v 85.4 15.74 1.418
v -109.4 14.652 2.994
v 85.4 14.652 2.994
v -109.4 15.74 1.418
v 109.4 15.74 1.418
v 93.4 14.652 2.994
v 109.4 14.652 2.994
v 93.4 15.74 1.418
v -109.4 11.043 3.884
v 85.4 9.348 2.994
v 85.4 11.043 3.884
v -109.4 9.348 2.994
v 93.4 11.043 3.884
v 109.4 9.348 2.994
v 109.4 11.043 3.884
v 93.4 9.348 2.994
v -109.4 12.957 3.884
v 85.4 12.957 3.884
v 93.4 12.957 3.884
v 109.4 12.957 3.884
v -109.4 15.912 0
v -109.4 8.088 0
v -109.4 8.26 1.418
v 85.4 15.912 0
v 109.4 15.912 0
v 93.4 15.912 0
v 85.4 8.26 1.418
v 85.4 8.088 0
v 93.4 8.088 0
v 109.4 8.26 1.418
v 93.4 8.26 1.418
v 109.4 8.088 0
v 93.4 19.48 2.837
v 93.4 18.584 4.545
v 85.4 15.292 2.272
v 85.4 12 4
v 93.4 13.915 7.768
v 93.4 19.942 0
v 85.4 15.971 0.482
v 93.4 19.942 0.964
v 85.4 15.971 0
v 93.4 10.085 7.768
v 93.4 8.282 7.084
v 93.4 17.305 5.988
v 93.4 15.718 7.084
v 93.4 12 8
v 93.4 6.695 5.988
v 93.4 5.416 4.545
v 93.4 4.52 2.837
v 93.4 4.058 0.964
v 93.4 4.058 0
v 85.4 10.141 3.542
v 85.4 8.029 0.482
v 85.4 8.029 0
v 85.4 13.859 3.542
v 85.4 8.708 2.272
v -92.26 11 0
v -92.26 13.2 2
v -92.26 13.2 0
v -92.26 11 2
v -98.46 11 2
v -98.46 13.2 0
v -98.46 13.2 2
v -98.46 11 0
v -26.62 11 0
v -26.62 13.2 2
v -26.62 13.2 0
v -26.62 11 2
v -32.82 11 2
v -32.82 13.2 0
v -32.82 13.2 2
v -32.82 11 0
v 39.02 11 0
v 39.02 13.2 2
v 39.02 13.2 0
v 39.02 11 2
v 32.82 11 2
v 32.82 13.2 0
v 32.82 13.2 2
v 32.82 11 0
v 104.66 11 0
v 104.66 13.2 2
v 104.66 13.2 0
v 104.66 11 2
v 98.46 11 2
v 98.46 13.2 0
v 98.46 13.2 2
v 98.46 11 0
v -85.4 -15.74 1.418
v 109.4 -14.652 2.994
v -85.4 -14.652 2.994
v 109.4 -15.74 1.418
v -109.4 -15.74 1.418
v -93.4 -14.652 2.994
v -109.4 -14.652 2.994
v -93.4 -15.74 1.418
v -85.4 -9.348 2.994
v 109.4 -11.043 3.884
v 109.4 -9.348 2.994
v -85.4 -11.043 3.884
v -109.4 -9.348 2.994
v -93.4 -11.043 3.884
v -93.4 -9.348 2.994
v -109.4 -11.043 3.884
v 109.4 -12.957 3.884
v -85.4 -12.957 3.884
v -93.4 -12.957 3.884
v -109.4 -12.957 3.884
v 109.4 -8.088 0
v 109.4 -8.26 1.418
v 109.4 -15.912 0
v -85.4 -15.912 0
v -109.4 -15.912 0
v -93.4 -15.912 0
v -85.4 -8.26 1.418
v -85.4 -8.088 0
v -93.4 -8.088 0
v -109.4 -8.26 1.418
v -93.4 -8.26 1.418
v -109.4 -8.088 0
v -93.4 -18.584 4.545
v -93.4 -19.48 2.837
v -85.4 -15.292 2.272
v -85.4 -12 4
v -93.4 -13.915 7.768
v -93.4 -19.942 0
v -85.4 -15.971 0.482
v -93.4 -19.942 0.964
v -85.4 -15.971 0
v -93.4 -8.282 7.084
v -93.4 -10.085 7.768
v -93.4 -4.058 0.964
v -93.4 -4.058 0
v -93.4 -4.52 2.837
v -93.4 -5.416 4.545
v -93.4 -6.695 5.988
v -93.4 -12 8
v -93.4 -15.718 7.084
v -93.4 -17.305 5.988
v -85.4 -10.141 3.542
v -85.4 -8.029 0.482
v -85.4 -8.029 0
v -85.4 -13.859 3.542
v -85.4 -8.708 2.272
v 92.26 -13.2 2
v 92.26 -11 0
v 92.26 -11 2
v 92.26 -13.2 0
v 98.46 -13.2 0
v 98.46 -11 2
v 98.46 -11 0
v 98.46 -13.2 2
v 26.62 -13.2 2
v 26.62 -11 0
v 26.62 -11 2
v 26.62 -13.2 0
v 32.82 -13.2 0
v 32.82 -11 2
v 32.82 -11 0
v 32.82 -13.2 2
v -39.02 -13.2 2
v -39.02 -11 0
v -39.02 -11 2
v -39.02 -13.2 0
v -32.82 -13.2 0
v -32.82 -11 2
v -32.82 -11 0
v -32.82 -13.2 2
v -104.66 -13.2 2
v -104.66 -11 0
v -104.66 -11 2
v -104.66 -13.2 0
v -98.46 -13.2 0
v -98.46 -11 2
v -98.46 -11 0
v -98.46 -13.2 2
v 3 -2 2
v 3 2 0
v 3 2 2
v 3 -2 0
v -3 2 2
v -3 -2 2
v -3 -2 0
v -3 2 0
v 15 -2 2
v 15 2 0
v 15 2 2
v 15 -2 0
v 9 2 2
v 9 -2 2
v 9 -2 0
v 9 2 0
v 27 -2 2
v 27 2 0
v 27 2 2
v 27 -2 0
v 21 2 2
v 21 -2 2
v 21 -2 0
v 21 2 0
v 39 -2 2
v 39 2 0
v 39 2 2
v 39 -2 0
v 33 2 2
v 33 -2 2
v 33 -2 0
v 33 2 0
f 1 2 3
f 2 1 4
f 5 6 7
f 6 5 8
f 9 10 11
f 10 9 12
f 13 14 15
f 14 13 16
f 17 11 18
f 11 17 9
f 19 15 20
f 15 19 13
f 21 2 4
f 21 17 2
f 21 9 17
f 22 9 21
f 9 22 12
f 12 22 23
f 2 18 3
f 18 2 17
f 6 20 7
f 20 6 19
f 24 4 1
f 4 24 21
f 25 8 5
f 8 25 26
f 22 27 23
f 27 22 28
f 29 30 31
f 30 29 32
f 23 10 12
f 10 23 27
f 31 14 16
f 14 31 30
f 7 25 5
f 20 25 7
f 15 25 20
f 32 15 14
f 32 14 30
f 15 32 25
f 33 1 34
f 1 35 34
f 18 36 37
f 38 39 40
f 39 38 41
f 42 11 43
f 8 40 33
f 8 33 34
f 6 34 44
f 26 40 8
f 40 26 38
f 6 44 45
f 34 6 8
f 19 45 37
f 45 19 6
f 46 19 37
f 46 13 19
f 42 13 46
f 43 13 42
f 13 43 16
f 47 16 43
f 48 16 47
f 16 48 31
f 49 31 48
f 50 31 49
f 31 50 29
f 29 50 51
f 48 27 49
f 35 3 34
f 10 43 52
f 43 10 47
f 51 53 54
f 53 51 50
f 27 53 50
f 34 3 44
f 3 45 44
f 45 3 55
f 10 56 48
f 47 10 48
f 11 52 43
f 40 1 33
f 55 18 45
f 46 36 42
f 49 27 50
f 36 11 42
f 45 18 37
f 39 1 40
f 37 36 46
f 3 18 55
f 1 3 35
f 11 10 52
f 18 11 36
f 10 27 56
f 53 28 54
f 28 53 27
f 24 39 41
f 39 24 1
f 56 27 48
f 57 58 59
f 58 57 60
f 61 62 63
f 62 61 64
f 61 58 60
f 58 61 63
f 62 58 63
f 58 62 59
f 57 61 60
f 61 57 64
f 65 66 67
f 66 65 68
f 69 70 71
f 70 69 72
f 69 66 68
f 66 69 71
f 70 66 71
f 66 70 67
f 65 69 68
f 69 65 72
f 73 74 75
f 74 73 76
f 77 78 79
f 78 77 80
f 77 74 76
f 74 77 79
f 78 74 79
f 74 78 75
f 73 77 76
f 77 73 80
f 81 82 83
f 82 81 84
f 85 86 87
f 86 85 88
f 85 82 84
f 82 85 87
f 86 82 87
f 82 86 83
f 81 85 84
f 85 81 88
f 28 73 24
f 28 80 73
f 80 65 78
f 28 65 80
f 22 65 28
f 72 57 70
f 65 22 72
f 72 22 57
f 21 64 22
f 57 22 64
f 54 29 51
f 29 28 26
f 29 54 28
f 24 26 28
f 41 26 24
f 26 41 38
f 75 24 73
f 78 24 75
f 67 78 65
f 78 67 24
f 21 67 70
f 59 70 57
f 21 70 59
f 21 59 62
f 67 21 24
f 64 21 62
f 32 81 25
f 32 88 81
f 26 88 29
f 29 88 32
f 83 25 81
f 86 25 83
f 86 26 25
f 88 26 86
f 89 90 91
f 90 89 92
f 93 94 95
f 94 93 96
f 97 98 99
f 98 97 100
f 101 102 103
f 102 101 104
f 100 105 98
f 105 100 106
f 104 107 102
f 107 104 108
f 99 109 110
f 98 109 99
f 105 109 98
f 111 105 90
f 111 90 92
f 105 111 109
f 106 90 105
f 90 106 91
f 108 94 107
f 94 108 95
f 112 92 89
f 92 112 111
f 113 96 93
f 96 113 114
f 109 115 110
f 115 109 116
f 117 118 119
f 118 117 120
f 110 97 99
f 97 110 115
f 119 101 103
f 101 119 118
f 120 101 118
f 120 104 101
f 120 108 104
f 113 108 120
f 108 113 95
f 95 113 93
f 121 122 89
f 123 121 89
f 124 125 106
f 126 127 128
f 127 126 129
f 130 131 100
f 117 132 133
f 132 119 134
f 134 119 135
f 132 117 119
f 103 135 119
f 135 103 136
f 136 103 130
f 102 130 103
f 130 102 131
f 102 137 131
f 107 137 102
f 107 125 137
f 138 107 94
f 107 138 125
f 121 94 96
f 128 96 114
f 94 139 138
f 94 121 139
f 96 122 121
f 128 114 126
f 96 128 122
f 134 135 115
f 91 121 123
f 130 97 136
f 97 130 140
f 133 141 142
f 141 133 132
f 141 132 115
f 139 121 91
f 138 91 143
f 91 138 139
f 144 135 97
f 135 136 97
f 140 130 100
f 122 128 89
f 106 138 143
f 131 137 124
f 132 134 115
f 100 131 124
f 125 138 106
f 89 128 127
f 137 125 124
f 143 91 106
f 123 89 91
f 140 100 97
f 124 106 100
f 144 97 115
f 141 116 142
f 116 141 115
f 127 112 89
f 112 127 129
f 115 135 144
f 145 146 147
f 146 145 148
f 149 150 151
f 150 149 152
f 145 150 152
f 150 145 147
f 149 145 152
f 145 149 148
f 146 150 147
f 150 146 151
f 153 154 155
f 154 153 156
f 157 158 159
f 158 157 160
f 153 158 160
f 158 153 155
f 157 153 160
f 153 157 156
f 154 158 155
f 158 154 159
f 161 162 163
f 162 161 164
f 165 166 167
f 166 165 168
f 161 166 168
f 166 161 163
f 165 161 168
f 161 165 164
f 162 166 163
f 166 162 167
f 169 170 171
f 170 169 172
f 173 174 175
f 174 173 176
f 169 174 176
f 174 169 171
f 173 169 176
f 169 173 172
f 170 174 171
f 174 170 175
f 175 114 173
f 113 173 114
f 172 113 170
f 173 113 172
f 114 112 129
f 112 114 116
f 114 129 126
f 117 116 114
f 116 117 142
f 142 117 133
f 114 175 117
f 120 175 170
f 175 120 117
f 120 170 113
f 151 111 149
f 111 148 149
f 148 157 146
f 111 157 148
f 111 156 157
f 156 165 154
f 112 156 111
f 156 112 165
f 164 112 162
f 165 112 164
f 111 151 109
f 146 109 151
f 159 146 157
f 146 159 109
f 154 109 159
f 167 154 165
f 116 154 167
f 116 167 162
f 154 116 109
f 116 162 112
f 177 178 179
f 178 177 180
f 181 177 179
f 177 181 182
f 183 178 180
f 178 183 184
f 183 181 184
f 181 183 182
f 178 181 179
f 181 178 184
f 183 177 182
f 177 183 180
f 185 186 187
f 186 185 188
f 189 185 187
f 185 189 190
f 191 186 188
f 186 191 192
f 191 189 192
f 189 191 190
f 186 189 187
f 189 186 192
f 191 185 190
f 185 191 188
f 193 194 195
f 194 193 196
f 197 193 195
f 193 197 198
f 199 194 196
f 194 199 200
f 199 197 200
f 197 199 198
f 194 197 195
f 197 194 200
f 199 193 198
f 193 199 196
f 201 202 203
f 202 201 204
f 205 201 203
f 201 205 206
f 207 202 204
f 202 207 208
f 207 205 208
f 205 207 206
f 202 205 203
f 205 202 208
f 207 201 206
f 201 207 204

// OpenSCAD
// file: carousel-config.scad
// ----------------------------------------------------------------------------
// Configuration of the carousel and its components.
//
// All the values beyod "---- derived" string in each of the sections should
// not be modified manually, as they are derived from the previously defined
// parameters in some way...
// ----------------------------------------------------------------------------

// Generic parameters to address consistency & interconnections of parts.
CYL_FN = 32; // BEWARE!!! set to +- 256 for STL export!
BLEED = 0.5; // overlap for union & difference operations
EASE = 0.2; // socket/pin ease for interconnecting of parts & holes

// Core defining shape of our carousel is N-faced cylinder.
// This affects most of the subsequent parameter definitions & usage.
CAROUSEL_FACE_COUNT = 6;
CAROUSEL_ESCRIBED_RADIUS = 120;
// ---- derived
CAROUSEL_INSCRIBED_RADIUS = CAROUSEL_ESCRIBED_RADIUS * cos(180/CAROUSEL_FACE_COUNT);

// Base of the carousel -> stand that holds the axle, walls, etc.
BASE_TOTAL_HEIGHT = 24;
BASE_FLOOR_THICKNESS = 4;
BASE_WALL_THICKNESS = 4;

// Face, or, a wall of the carousel "shell".
FACE_HEIGHT = 150;
FACE_THICKNESS = 5;
// ---- derived
FACE_WIDTH = CAROUSEL_ESCRIBED_RADIUS * 2 * sin(180/CAROUSEL_FACE_COUNT);
FACE_ANGLE = (1 - 2/CAROUSEL_FACE_COUNT)*180;
FACE_APOTHEM_LEN = FACE_WIDTH / (2 * tan(180/CAROUSEL_FACE_COUNT));
FACE_DOOR_HEIGHT = 0.66 * FACE_HEIGHT;
FACE_DOOR_WIDTH = 0.75 * FACE_WIDTH;

// Roof of the carousel.
ROOF_THICKNESS = 2;
ROOF_HEIGHT = 1.3 * FACE_HEIGHT;

// Ball bearing - real-life dimensions of ball bearing used to "power" the axle.
BEARING_OUTER_D = 22;
BEARING_INNER_D = 8;
BEARING_HEIGHT = 7;
BEARING_SHELL_THICKNESS = 2;

// Axle rotating inside carousel.
AXLE_RADIUS = 4;

// Rotating rig carrying the seats.
RIG_HEIGHT = 6;
RIG_STR = 6;

// Abstract "rings" carrying seats, and their distance off the carousel center
// as a fraction of radius.
RIG_RING_POSITIONS = [0.3, 0.6, 0.9];
RIG_MAX_R = 0.90 * CAROUSEL_INSCRIBED_RADIUS;
// main file
include <carousel-config.scad>;

_AXLE_COLOR = "SaddleBrown";

arm_height = 2 * AXLE_RADIUS;
axle_height = ROOF_HEIGHT + BASE_TOTAL_HEIGHT - EASE;

module carousel_axle_arms() {
    arm_length = 8 * AXLE_RADIUS;
    arm_width = AXLE_RADIUS;

    color(_AXLE_COLOR) {
        difference() {
            union() {
                cylinder(h = arm_height, r = 2 * AXLE_RADIUS);
                for (i = [0 : CAROUSEL_FACE_COUNT/2]){
                    rotate(2 * i * 360/CAROUSEL_FACE_COUNT, [0, 0, 1])
                    translate([0, -arm_width/2, 0])
                    cube([arm_length, arm_width, arm_height]);
                }    
            }
            translate([0, 0, -BLEED/2])
                cylinder(h = arm_height + BLEED, r = AXLE_RADIUS + EASE);
        }
    }
}

module carousel_axle() {
    color(_AXLE_COLOR) {
        cylinder(h = axle_height, r = AXLE_RADIUS);
        translate([0, 0, axle_height - 3 * arm_height])
            cylinder(h = 2 * AXLE_RADIUS, r1 = AXLE_RADIUS, r2 = 2 * AXLE_RADIUS);
    }    
}

// just for presentation, for 3D print the separate parts are better...
module carousel_axle_all_in_one() {
    carousel_axle();
    translate([0, 0, axle_height - 2 * arm_height])
    carousel_axle_arms();
}

PEG_SIZE = [0.5 * AXLE_RADIUS, 0.5 * AXLE_RADIUS, 1.5 * AXLE_RADIUS];

module carousel_axle_half() {
    peg_heights = [0.05, 0.35, 0.65, 0.95];

    translate([-axle_height/2, 0, 0])
    rotate([0, 90, 0])
    difference() {
        carousel_axle();
        translate([0, -5 * AXLE_RADIUS, -BLEED/2])
            cube([10 * AXLE_RADIUS, 10 * AXLE_RADIUS, axle_height + BLEED]);
        for (fz = peg_heights) {
            translate([-PEG_SIZE.x, -PEG_SIZE.y/2, fz * axle_height])
                cube([PEG_SIZE.x + EASE, PEG_SIZE.y + EASE, PEG_SIZE.z + EASE]);
        }
    }
}

module carousel_axle_peg() {
    //translate([0, 0, PEG_SIZE.x/2])
    x = PEG_SIZE.z;
    y = PEG_SIZE.y * 2;
    z = PEG_SIZE.x;

    color(_AXLE_COLOR)
    cube([x, y, z], center = true);
}

module carousel_axle_bom() {
    dy = 3 * AXLE_RADIUS;

    translate([0, dy, 0])
    carousel_axle_half();

    translate([0, -dy, 0])
    rotate([0, 0, 180])
        carousel_axle_half();

    for (i = [0:3]) {
        translate([2 * i * PEG_SIZE.z, 0, PEG_SIZE.x/2])
        carousel_axle_peg();
    }
}

carousel_axle_bom();
